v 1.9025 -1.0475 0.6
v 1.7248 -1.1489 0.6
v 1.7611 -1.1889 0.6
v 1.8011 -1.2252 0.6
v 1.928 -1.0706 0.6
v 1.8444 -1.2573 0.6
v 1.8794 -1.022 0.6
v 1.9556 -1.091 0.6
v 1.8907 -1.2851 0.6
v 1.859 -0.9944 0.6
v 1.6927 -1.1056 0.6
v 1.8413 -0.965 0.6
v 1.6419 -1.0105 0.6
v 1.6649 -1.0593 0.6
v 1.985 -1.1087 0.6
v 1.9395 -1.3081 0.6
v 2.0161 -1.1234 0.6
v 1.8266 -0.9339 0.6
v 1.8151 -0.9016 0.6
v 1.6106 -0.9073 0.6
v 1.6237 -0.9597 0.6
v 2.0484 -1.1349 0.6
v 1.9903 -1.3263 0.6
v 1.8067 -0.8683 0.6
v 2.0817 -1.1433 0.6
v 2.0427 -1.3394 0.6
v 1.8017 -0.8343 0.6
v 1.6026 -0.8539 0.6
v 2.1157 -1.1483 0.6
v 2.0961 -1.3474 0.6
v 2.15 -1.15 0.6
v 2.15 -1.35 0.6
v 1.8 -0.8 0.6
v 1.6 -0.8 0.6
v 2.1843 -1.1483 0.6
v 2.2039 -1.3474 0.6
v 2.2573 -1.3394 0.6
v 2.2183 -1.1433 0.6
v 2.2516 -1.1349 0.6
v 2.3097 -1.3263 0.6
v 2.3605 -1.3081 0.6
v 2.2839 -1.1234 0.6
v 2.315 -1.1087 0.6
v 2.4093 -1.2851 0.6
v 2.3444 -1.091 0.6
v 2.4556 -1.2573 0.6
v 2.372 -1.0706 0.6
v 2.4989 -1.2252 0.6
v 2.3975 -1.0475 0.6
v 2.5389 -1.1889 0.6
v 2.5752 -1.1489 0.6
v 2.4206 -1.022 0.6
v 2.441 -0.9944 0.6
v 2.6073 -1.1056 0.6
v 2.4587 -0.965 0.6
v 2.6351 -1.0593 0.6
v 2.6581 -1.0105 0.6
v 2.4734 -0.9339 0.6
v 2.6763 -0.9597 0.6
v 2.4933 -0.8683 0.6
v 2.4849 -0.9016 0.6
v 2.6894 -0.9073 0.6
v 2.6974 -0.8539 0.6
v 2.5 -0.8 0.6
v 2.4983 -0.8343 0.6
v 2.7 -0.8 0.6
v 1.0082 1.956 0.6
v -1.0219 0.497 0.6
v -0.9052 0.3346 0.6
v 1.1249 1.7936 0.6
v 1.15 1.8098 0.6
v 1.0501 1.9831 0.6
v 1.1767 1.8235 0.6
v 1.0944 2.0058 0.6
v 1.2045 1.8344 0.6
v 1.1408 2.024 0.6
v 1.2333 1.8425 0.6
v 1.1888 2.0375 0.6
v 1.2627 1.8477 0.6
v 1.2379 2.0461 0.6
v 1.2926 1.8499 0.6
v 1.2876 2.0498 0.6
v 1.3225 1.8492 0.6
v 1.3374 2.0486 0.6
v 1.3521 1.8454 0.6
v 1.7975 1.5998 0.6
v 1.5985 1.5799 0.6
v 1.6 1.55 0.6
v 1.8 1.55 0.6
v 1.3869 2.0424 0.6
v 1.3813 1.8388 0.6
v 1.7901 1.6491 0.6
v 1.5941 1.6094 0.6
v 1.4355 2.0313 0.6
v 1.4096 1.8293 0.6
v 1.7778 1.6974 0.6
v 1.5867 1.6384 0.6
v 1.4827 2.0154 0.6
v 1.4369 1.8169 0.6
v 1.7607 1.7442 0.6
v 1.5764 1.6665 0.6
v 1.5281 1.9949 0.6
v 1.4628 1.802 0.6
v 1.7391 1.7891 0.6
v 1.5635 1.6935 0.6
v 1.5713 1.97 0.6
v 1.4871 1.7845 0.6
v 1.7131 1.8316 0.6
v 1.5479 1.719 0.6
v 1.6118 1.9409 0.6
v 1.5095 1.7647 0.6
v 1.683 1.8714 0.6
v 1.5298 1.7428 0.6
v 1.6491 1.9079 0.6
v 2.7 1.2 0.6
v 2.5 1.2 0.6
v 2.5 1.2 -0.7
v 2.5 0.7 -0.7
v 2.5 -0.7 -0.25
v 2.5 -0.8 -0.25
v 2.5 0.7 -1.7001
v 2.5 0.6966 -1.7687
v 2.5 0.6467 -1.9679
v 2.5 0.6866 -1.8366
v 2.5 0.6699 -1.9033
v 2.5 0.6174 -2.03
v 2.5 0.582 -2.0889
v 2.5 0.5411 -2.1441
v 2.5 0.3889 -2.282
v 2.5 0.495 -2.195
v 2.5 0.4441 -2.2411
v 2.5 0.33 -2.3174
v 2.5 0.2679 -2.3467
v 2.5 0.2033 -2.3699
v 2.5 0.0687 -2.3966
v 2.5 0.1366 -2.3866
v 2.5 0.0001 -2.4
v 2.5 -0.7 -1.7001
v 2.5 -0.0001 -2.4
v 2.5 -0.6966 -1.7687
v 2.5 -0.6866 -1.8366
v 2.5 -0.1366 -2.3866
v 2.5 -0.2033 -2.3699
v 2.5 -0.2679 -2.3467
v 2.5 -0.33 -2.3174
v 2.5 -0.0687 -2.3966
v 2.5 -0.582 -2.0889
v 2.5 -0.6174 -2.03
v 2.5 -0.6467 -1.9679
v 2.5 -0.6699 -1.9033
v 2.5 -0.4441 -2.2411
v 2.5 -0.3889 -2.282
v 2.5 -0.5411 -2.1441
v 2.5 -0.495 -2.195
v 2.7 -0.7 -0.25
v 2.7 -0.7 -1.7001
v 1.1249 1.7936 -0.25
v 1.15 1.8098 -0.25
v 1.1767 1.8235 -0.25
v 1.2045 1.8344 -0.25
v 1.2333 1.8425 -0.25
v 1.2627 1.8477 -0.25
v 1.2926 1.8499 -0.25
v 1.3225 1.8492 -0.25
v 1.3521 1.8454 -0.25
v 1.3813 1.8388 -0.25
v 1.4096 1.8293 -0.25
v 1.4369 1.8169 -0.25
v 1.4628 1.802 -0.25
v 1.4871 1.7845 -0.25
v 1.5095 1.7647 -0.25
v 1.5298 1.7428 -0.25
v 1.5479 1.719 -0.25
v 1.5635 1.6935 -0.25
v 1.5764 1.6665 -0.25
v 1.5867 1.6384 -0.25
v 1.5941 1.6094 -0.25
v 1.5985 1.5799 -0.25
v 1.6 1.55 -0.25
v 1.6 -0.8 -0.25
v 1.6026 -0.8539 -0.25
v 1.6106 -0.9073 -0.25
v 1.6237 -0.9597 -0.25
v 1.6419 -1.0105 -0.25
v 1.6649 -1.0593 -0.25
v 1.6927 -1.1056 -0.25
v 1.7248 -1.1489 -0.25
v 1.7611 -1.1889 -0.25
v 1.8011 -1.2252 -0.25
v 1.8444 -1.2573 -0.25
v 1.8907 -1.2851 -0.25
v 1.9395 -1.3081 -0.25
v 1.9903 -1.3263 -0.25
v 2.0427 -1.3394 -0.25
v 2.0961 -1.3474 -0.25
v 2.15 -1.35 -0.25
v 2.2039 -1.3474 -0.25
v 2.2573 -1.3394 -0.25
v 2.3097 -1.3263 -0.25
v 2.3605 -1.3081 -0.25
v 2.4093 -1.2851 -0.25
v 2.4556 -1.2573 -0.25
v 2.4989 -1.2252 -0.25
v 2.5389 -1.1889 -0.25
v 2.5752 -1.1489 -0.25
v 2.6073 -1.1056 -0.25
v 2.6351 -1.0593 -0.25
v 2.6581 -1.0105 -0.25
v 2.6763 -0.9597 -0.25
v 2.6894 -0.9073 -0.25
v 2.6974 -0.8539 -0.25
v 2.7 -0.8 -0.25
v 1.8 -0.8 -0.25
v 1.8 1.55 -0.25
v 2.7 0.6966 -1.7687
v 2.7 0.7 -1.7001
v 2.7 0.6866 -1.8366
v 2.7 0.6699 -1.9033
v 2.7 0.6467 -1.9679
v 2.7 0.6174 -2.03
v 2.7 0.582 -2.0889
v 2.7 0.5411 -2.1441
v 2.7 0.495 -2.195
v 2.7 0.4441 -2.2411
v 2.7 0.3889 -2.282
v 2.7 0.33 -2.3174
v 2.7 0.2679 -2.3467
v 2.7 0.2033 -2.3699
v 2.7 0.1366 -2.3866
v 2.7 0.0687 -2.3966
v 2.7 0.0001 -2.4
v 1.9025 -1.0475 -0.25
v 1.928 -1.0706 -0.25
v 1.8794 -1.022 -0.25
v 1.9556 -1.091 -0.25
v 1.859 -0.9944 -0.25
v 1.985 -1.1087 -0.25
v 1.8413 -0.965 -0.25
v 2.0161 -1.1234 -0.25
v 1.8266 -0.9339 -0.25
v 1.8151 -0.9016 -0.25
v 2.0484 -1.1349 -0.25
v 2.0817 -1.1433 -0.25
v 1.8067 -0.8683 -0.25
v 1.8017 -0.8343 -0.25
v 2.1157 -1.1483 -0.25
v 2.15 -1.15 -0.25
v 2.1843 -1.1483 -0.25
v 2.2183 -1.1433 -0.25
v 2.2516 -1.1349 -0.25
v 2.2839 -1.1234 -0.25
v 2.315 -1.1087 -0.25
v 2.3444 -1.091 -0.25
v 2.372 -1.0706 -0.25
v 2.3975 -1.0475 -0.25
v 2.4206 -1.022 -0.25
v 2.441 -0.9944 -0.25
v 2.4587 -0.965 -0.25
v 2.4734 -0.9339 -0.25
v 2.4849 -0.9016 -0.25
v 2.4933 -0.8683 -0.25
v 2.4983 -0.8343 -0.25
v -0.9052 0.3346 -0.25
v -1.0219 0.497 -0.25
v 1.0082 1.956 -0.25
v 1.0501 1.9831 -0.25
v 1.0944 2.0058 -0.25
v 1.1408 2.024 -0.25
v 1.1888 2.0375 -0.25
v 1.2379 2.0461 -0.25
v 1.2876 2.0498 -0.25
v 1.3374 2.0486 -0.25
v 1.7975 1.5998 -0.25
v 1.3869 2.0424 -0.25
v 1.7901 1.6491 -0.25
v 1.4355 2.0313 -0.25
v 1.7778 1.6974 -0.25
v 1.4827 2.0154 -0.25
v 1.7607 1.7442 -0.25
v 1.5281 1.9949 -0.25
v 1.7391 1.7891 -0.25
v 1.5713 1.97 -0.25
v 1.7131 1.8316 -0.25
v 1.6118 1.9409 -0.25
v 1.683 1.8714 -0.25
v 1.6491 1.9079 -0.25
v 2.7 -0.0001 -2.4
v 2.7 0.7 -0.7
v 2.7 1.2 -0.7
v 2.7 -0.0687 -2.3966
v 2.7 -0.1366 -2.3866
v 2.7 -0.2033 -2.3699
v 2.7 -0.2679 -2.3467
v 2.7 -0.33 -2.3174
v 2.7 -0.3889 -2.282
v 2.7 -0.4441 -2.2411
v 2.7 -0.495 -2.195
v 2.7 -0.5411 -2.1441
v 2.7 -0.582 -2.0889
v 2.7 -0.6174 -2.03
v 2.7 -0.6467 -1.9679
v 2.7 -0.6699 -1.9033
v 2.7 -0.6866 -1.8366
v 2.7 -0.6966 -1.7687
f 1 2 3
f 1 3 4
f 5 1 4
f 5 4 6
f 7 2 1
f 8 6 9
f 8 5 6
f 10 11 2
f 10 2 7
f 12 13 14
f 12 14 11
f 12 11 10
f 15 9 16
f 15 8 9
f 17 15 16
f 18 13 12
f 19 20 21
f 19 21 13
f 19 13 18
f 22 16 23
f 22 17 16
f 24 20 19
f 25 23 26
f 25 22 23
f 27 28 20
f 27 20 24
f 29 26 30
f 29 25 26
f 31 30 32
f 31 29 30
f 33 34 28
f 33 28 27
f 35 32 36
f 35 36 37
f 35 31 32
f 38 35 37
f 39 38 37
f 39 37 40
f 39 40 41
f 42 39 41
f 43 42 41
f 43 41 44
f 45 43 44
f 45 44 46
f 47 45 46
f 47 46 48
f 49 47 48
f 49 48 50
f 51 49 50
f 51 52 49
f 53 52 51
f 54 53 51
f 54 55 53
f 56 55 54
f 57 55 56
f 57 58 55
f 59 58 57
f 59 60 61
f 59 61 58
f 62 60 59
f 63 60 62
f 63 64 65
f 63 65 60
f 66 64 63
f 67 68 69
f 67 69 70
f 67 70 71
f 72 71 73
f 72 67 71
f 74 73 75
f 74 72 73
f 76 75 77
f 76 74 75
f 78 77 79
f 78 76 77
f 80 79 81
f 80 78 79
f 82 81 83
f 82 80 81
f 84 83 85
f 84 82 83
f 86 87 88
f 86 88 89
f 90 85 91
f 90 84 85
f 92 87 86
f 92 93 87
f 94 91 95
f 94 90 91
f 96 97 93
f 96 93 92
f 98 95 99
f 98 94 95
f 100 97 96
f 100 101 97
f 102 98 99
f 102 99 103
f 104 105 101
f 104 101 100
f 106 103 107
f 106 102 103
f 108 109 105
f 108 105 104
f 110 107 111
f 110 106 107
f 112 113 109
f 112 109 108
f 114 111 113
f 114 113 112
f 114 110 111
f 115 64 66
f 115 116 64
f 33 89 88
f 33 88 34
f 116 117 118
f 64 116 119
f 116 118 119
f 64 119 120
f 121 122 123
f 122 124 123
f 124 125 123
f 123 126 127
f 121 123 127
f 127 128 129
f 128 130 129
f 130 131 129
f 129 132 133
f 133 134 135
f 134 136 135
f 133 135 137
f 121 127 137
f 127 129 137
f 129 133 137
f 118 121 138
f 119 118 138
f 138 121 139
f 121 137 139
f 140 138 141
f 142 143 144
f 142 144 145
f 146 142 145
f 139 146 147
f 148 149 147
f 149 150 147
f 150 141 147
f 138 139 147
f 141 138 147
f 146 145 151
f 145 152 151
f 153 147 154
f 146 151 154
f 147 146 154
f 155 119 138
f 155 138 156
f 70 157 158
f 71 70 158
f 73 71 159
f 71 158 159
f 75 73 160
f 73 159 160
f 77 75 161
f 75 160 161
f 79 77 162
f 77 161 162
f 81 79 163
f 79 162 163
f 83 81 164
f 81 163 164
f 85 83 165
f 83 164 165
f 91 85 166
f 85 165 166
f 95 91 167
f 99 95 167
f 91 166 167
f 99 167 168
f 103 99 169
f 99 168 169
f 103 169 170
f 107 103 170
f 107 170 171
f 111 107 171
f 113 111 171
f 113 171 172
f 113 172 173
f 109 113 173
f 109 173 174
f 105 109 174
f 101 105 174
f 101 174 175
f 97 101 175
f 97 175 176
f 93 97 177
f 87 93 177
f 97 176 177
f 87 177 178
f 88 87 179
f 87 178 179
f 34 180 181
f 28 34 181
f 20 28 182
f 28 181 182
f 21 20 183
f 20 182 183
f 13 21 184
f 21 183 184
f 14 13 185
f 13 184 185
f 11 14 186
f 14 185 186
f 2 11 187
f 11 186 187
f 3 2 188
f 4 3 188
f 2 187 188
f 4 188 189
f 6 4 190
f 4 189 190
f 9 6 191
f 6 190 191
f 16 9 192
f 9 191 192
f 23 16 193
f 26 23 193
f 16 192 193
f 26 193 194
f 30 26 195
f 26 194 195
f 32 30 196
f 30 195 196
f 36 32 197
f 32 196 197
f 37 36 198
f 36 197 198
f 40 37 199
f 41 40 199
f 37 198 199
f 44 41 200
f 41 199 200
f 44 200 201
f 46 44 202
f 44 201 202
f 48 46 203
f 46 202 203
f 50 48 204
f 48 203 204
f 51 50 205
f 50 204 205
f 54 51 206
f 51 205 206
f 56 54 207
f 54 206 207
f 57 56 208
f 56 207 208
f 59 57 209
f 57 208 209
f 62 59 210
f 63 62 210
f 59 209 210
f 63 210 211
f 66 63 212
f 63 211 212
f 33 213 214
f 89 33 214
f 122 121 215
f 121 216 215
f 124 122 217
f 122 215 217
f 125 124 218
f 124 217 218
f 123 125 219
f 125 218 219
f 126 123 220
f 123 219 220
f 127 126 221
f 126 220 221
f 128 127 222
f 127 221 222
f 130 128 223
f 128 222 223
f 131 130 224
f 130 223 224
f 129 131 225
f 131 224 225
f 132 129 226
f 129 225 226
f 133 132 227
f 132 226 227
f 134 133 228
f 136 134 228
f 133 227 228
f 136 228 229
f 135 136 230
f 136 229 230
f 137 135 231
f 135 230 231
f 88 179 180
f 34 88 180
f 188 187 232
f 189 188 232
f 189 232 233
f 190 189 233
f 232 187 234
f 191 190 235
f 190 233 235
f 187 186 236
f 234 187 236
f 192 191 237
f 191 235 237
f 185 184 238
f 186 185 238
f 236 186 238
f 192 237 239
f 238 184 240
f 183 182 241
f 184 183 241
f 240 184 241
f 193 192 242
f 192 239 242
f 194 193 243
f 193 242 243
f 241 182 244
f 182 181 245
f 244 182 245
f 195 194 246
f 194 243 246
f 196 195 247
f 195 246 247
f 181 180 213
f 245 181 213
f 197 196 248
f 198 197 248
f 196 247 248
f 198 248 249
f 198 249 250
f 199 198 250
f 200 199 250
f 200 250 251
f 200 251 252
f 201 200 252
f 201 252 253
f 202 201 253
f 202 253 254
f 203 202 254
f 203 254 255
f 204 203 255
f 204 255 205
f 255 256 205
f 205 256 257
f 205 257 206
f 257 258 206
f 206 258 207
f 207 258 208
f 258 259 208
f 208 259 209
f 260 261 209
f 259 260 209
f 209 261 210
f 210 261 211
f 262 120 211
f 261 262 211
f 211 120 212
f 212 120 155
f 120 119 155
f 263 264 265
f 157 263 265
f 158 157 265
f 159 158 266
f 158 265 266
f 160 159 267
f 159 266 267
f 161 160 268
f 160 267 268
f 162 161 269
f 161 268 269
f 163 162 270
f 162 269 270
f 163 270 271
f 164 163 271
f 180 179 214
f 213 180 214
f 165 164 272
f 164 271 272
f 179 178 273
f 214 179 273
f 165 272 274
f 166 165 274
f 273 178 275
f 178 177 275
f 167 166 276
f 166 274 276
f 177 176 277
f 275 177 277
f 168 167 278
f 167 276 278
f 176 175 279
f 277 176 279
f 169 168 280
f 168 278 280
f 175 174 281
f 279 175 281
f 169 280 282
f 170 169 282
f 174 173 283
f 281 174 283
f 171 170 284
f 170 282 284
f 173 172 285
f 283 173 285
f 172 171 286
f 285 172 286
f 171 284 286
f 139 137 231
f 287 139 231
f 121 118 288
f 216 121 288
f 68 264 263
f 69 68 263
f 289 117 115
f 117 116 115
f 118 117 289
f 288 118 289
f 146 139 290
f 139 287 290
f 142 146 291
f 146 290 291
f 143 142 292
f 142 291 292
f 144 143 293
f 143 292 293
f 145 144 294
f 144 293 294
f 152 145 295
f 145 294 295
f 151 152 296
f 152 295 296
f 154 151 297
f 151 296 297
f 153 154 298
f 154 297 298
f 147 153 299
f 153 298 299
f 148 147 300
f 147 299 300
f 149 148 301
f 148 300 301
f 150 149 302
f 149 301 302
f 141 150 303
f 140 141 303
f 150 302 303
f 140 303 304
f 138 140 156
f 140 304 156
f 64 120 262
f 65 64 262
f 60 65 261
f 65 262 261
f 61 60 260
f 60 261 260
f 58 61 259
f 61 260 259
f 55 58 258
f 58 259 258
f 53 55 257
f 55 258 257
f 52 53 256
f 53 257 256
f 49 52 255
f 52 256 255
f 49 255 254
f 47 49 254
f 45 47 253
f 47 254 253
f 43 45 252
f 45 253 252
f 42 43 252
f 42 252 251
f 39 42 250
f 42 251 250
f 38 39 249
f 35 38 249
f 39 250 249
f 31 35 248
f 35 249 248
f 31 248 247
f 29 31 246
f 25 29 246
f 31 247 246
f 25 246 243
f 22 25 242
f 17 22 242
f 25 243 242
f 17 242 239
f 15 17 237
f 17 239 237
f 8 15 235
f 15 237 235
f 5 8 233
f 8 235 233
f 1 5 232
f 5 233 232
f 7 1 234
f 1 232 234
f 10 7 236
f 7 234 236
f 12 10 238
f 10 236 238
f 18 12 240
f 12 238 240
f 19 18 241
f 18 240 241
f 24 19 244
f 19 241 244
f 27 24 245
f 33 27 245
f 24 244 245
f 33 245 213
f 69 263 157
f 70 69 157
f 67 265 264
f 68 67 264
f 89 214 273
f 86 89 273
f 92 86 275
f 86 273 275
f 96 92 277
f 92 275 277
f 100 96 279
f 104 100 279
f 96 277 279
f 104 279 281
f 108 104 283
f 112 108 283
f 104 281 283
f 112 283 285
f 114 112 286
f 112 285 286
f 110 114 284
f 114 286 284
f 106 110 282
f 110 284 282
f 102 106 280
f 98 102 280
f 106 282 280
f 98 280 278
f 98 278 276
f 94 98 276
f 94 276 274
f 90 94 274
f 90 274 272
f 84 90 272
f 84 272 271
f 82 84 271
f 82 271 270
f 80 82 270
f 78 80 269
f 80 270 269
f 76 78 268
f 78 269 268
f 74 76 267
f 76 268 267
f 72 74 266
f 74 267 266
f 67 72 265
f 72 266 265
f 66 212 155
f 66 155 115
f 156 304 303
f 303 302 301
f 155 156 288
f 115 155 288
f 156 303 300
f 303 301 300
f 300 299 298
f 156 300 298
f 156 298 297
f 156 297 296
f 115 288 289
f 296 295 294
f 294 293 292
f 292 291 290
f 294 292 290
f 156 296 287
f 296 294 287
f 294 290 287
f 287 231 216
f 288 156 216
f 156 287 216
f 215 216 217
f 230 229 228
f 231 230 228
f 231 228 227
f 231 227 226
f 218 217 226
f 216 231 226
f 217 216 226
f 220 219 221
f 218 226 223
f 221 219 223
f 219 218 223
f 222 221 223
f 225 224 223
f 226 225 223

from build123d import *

# Parameters (mm, degrees)
SKETCH1_W           = 0.2
SKETCH1_H           = 1.4
SKETCH1_H_2         = 0.5
BOSS_EXTRUDE1_DEPTH = 0.6
SKETCH1_3_W         = 0.2
SKETCH1_3_H         = 1.4
SKETCH1_3_H_2       = 0.5
BOSS_EXTRUDE2_DEPTH = 0.7
BOSS_EXTRUDE3_START = -0.7
SKETCH1_5_W         = 0.2
SKETCH1_5_H         = 1.4
BOSS_EXTRUDE3_DEPTH = 1.7
FILLET1_R           = 0.7
BOSS_EXTRUDE4_START = -0.25
BOSS_EXTRUDE4_DEPTH = 0.25


with BuildPart() as part:
    # Sketch1 → Boss-Extrude1 (new body)
    with BuildSketch(Plane.XY):
        with BuildLine():
            Line((1.008203317, 1.956023024), (-1.021911803, 0.497039611))
            Line((-1.021911803, 0.497039611), (-0.90519313, 0.334630402))
            Line((-0.90519313, 0.334630402), (1.12492199, 1.793613814))
            ThreePointArc((1.12492199, 1.793613814), (1.436887905, 1.816948874), (1.6, 1.55))
            Line((1.6, 1.55), (1.6, -0.8))
            ThreePointArc((1.6, -0.8), (2.15, -1.35), (2.7, -0.8))
            Line((2.7, -0.8), (2.7, -0.7))
            Line((2.7, -0.7), (2.5, -0.7))
            Line((2.5, -0.7), (2.5, -0.8))
            ThreePointArc((2.5, -0.8), (2.15, -1.15), (1.8, -0.8))
            Line((1.8, -0.8), (1.8, 1.55))
            ThreePointArc((1.8, 1.55), (1.528146509, 1.99491479), (1.008203317, 1.956023024))
        make_face()
        with Locations((2.6, 0)):
            Rectangle(SKETCH1_W, SKETCH1_H)
        with Locations((2.6, 0.95)):
            Rectangle(SKETCH1_W, SKETCH1_H_2)
    extrude(amount=BOSS_EXTRUDE1_DEPTH)

    # Sketch1<3> → Boss-Extrude2 (add)
    with BuildSketch(Plane.XY):
        with Locations((2.6, 0)):
            Rectangle(SKETCH1_3_W, SKETCH1_3_H)
        with Locations((2.6, 0.95)):
            Rectangle(SKETCH1_3_W, SKETCH1_3_H_2)
    extrude(amount=-BOSS_EXTRUDE2_DEPTH)

    # Sketch1<5> → Boss-Extrude3 (add)
    with BuildSketch(Plane.XY.offset(BOSS_EXTRUDE3_START)):
        with Locations((2.6, 0)):
            Rectangle(SKETCH1_5_W, SKETCH1_5_H)
    extrude(amount=-BOSS_EXTRUDE3_DEPTH)

    # Fillet1
    fillet1_edges = [part.edges().sort_by_distance(p)[0] for p in [
        (2.6, 0.7, -2.4),
        (2.6, -0.7, -2.4),
    ]]
    fillet(fillet1_edges, radius=FILLET1_R - 0.0001)  # a hair under: the kernel refuses the full size

    # Sketch1<6> → Boss-Extrude4 (add)
    with BuildSketch(Plane.XY.offset(BOSS_EXTRUDE4_START)):
        with BuildLine():
            Line((1.008203317, 1.956023024), (-1.021911803, 0.497039611))
            Line((-1.021911803, 0.497039611), (-0.90519313, 0.334630402))
            Line((-0.90519313, 0.334630402), (1.12492199, 1.793613814))
            ThreePointArc((1.12492199, 1.793613814), (1.436887905, 1.816948874), (1.6, 1.55))
            Line((1.6, 1.55), (1.6, -0.8))
            ThreePointArc((1.6, -0.8), (2.15, -1.35), (2.7, -0.8))
            Line((2.7, -0.8), (2.7, -0.7))
            Line((2.7, -0.7), (2.5, -0.7))
            Line((2.5, -0.7), (2.5, -0.8))
            ThreePointArc((2.5, -0.8), (2.15, -1.15), (1.8, -0.8))
            Line((1.8, -0.8), (1.8, 1.55))
            ThreePointArc((1.8, 1.55), (1.528146509, 1.99491479), (1.008203317, 1.956023024))
        make_face()
    extrude(amount=BOSS_EXTRUDE4_DEPTH)


solid = part.part
